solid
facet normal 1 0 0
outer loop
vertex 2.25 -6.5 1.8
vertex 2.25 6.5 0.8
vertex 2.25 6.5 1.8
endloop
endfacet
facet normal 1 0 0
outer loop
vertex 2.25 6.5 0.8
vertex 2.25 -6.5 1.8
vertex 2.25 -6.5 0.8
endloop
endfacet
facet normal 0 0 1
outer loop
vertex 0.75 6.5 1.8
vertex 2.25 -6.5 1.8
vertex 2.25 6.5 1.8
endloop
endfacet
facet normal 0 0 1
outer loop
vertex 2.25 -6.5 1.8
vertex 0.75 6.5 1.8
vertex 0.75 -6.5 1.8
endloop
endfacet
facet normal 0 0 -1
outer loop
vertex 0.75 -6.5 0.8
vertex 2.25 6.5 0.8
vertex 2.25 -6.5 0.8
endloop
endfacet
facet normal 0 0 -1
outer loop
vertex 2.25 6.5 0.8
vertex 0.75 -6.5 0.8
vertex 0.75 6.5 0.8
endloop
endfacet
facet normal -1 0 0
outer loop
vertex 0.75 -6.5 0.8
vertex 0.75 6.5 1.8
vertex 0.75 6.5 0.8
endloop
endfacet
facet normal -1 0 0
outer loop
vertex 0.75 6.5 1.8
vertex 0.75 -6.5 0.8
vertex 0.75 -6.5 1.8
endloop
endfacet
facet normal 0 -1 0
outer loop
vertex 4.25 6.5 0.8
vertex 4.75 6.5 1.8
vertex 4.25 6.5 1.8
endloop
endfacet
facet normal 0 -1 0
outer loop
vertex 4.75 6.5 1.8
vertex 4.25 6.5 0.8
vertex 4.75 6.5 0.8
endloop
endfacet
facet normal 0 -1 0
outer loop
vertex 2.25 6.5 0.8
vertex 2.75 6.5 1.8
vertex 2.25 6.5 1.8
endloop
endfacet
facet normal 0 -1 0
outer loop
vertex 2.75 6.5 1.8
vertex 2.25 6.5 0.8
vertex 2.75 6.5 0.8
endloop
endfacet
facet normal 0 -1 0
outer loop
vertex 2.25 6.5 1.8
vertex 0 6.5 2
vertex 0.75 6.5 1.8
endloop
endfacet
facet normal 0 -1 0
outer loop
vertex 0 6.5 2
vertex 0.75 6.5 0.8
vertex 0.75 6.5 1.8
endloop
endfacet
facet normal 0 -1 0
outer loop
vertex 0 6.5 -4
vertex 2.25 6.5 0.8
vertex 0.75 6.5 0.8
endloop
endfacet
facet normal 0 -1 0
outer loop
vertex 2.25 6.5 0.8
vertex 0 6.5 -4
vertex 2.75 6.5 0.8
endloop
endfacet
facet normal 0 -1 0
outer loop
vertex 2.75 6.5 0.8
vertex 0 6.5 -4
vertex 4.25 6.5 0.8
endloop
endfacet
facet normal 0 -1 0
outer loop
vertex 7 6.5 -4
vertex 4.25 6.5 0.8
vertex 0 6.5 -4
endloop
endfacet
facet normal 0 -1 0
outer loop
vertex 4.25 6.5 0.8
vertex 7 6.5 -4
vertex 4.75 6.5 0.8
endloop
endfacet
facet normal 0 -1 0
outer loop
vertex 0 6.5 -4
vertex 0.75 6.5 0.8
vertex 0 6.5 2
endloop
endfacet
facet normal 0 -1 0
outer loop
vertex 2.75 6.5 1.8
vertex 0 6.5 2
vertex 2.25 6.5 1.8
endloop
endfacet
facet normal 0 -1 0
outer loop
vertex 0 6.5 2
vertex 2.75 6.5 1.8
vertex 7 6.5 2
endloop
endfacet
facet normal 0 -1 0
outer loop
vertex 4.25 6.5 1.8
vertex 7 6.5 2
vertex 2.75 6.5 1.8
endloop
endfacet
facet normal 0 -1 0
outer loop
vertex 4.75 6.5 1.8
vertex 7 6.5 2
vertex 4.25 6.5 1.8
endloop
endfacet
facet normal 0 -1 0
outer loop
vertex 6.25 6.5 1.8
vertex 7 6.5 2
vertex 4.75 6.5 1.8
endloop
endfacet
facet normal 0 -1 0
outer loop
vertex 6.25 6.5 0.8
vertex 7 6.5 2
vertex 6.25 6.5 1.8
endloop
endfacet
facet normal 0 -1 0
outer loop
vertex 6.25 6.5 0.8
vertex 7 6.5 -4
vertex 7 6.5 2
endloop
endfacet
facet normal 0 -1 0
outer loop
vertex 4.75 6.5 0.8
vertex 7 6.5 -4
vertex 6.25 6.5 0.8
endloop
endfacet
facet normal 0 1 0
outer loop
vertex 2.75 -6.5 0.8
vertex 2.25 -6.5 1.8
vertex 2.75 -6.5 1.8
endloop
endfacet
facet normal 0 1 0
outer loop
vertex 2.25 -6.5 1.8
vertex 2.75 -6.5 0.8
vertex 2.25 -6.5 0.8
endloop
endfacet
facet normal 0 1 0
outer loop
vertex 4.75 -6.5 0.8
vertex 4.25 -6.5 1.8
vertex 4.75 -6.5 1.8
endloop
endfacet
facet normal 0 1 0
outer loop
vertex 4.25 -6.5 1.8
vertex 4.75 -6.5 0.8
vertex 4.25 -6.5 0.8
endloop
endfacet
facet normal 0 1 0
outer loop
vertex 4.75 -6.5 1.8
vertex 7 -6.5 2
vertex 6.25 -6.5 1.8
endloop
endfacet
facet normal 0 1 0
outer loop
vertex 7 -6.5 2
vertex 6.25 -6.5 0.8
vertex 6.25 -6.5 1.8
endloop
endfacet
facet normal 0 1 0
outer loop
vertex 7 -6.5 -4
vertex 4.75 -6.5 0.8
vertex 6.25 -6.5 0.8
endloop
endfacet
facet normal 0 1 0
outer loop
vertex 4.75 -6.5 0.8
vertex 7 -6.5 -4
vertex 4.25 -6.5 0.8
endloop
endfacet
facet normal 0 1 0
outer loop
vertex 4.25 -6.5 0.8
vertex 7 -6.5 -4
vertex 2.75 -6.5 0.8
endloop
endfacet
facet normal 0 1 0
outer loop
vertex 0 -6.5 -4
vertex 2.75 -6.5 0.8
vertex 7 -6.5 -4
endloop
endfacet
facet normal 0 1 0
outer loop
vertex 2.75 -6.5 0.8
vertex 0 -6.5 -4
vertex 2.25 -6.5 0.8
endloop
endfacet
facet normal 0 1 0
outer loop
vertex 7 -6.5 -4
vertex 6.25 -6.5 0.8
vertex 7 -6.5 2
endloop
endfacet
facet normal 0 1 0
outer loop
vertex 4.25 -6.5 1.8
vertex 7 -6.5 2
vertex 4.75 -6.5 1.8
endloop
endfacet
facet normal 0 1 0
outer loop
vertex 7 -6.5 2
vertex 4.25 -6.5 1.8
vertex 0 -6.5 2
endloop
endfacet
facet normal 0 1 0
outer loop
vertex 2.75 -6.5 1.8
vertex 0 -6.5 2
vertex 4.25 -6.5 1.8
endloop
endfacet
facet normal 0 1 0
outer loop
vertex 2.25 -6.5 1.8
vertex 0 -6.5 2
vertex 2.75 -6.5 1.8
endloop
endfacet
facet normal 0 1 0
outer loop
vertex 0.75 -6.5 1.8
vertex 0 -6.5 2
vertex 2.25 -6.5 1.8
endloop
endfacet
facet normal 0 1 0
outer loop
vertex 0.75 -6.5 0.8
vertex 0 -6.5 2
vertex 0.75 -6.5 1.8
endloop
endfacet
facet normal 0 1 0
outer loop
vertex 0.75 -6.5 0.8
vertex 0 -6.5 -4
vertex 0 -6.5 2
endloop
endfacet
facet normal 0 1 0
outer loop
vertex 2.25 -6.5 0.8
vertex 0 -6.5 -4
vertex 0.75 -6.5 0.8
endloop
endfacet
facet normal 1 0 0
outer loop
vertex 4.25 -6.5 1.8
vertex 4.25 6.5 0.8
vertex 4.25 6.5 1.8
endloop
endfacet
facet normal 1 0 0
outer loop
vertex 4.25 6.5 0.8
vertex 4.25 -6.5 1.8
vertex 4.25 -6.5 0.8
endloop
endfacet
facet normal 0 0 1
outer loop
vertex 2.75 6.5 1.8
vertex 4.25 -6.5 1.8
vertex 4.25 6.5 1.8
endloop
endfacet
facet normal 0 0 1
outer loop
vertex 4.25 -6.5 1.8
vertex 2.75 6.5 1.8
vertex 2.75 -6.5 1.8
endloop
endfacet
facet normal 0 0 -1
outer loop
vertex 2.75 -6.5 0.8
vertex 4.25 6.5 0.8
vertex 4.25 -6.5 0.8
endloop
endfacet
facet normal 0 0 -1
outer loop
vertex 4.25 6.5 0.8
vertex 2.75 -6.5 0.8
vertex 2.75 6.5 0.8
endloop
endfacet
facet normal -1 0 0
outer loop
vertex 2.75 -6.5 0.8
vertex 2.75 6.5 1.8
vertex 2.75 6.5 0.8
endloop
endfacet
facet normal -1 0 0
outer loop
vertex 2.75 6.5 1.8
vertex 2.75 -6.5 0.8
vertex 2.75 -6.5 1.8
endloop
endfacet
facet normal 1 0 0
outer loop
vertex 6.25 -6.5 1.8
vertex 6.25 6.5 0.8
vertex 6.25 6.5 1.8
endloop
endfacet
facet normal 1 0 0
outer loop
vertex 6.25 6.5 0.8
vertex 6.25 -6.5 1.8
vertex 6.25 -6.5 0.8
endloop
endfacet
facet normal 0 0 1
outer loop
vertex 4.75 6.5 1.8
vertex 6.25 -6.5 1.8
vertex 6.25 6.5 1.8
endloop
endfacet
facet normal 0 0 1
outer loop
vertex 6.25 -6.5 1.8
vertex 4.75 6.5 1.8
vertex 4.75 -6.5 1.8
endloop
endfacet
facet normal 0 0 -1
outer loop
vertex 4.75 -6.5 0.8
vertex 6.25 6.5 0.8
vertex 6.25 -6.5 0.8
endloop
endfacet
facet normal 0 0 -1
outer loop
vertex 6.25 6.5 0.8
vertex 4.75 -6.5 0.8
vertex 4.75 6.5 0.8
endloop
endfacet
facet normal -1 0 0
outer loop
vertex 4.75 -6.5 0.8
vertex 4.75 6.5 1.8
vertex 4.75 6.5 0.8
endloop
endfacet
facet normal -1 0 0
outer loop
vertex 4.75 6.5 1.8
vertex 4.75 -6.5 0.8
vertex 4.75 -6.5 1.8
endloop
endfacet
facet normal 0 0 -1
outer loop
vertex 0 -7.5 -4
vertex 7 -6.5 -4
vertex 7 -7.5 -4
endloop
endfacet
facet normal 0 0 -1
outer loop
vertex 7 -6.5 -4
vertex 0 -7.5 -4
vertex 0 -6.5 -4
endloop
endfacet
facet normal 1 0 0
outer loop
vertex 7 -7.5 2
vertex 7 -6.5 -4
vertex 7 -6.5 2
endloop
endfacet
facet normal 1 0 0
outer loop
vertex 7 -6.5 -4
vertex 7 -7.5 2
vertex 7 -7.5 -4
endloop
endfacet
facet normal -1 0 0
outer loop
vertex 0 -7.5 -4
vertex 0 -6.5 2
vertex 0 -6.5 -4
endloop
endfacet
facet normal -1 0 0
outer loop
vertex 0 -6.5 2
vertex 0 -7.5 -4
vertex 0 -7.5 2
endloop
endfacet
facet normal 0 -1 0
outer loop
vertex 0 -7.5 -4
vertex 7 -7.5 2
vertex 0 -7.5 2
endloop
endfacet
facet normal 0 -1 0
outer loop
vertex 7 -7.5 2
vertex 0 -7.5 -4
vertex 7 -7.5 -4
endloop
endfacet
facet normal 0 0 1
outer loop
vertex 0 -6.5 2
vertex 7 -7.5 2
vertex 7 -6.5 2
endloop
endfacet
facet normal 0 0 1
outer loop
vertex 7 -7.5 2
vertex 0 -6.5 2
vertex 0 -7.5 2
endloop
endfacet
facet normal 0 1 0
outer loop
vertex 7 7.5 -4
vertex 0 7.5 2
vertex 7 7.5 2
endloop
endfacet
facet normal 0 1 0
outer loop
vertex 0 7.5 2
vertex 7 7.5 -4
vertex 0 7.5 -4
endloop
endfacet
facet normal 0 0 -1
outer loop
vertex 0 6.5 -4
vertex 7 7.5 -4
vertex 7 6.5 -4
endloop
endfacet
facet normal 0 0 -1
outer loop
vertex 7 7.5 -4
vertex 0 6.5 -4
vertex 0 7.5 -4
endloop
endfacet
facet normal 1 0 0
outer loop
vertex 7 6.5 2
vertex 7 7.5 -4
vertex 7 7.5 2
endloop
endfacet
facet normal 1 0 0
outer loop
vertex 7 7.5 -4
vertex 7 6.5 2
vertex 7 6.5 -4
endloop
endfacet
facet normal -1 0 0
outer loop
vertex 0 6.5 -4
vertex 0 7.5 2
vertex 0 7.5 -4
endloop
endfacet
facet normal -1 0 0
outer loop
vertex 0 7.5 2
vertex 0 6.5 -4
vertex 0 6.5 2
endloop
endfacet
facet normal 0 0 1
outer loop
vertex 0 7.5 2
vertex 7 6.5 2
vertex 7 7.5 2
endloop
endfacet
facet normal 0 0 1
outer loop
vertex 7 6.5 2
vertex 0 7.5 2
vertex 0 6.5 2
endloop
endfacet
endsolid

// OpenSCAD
module Bench_02(){

    color("gray")
    translate([0,-7,0])
    rotate([90,0,0])
    linear_extrude(1, scale = 1, center = true)
    polygon(points=[[0,-4],[7,-4],[7,2],[0,2]]);
         
         
    translate([0,7,0])    
    color("gray")

    rotate([90,0,0])
    linear_extrude(1, scale = 1, center = true)
    polygon(points=[[0,-4],[7,-4],[7,2],[0,2]]);   

    color("#c69874"){
    translate([1.5,0,1.3]) 
    cube([1.5,13,1], center = true);

    translate([3.5,0,1.3]) 
    cube([1.5,13,1], center = true);

    translate([5.5,0,1.3]) 
    cube([1.5,13,1], center = true);
    }

}

Bench_02();

// Written by Nicolì Angelo (Gengio) 2024: 
// MIT License


//Permission is hereby granted, free of charge, to any person obtaining a copy of this software and associated documentation files (the "Software"), to deal in the Software without restriction, including without limitation the rights to use, copy, modify, merge, publish, distribute, sublicense, and/or sell copies of the Software, and to permit persons to whom the Software is furnished to do so, subject to the following conditions:

//The above copyright notice and this permission notice shall be included in all copies or substantial portions of the Software.

//THE SOFTWARE IS PROVIDED "AS IS", WITHOUT WARRANTY OF ANY KIND, EXPRESS OR IMPLIED, INCLUDING BUT NOT LIMITED TO THE WARRANTIES OF MERCHANTABILITY, FITNESS FOR A PARTICULAR PURPOSE AND NONINFRINGEMENT. IN NO EVENT SHALL THE AUTHORS OR COPYRIGHT HOLDERS BE LIABLE FOR ANY CLAIM, DAMAGES OR OTHER LIABILITY, WHETHER IN AN ACTION OF CONTRACT, TORT OR OTHERWISE, ARISING FROM, OUT OF OR IN CONNECTION WITH THE SOFTWARE OR THE USE OR OTHER DEALINGS IN THE SOFTWARE.
